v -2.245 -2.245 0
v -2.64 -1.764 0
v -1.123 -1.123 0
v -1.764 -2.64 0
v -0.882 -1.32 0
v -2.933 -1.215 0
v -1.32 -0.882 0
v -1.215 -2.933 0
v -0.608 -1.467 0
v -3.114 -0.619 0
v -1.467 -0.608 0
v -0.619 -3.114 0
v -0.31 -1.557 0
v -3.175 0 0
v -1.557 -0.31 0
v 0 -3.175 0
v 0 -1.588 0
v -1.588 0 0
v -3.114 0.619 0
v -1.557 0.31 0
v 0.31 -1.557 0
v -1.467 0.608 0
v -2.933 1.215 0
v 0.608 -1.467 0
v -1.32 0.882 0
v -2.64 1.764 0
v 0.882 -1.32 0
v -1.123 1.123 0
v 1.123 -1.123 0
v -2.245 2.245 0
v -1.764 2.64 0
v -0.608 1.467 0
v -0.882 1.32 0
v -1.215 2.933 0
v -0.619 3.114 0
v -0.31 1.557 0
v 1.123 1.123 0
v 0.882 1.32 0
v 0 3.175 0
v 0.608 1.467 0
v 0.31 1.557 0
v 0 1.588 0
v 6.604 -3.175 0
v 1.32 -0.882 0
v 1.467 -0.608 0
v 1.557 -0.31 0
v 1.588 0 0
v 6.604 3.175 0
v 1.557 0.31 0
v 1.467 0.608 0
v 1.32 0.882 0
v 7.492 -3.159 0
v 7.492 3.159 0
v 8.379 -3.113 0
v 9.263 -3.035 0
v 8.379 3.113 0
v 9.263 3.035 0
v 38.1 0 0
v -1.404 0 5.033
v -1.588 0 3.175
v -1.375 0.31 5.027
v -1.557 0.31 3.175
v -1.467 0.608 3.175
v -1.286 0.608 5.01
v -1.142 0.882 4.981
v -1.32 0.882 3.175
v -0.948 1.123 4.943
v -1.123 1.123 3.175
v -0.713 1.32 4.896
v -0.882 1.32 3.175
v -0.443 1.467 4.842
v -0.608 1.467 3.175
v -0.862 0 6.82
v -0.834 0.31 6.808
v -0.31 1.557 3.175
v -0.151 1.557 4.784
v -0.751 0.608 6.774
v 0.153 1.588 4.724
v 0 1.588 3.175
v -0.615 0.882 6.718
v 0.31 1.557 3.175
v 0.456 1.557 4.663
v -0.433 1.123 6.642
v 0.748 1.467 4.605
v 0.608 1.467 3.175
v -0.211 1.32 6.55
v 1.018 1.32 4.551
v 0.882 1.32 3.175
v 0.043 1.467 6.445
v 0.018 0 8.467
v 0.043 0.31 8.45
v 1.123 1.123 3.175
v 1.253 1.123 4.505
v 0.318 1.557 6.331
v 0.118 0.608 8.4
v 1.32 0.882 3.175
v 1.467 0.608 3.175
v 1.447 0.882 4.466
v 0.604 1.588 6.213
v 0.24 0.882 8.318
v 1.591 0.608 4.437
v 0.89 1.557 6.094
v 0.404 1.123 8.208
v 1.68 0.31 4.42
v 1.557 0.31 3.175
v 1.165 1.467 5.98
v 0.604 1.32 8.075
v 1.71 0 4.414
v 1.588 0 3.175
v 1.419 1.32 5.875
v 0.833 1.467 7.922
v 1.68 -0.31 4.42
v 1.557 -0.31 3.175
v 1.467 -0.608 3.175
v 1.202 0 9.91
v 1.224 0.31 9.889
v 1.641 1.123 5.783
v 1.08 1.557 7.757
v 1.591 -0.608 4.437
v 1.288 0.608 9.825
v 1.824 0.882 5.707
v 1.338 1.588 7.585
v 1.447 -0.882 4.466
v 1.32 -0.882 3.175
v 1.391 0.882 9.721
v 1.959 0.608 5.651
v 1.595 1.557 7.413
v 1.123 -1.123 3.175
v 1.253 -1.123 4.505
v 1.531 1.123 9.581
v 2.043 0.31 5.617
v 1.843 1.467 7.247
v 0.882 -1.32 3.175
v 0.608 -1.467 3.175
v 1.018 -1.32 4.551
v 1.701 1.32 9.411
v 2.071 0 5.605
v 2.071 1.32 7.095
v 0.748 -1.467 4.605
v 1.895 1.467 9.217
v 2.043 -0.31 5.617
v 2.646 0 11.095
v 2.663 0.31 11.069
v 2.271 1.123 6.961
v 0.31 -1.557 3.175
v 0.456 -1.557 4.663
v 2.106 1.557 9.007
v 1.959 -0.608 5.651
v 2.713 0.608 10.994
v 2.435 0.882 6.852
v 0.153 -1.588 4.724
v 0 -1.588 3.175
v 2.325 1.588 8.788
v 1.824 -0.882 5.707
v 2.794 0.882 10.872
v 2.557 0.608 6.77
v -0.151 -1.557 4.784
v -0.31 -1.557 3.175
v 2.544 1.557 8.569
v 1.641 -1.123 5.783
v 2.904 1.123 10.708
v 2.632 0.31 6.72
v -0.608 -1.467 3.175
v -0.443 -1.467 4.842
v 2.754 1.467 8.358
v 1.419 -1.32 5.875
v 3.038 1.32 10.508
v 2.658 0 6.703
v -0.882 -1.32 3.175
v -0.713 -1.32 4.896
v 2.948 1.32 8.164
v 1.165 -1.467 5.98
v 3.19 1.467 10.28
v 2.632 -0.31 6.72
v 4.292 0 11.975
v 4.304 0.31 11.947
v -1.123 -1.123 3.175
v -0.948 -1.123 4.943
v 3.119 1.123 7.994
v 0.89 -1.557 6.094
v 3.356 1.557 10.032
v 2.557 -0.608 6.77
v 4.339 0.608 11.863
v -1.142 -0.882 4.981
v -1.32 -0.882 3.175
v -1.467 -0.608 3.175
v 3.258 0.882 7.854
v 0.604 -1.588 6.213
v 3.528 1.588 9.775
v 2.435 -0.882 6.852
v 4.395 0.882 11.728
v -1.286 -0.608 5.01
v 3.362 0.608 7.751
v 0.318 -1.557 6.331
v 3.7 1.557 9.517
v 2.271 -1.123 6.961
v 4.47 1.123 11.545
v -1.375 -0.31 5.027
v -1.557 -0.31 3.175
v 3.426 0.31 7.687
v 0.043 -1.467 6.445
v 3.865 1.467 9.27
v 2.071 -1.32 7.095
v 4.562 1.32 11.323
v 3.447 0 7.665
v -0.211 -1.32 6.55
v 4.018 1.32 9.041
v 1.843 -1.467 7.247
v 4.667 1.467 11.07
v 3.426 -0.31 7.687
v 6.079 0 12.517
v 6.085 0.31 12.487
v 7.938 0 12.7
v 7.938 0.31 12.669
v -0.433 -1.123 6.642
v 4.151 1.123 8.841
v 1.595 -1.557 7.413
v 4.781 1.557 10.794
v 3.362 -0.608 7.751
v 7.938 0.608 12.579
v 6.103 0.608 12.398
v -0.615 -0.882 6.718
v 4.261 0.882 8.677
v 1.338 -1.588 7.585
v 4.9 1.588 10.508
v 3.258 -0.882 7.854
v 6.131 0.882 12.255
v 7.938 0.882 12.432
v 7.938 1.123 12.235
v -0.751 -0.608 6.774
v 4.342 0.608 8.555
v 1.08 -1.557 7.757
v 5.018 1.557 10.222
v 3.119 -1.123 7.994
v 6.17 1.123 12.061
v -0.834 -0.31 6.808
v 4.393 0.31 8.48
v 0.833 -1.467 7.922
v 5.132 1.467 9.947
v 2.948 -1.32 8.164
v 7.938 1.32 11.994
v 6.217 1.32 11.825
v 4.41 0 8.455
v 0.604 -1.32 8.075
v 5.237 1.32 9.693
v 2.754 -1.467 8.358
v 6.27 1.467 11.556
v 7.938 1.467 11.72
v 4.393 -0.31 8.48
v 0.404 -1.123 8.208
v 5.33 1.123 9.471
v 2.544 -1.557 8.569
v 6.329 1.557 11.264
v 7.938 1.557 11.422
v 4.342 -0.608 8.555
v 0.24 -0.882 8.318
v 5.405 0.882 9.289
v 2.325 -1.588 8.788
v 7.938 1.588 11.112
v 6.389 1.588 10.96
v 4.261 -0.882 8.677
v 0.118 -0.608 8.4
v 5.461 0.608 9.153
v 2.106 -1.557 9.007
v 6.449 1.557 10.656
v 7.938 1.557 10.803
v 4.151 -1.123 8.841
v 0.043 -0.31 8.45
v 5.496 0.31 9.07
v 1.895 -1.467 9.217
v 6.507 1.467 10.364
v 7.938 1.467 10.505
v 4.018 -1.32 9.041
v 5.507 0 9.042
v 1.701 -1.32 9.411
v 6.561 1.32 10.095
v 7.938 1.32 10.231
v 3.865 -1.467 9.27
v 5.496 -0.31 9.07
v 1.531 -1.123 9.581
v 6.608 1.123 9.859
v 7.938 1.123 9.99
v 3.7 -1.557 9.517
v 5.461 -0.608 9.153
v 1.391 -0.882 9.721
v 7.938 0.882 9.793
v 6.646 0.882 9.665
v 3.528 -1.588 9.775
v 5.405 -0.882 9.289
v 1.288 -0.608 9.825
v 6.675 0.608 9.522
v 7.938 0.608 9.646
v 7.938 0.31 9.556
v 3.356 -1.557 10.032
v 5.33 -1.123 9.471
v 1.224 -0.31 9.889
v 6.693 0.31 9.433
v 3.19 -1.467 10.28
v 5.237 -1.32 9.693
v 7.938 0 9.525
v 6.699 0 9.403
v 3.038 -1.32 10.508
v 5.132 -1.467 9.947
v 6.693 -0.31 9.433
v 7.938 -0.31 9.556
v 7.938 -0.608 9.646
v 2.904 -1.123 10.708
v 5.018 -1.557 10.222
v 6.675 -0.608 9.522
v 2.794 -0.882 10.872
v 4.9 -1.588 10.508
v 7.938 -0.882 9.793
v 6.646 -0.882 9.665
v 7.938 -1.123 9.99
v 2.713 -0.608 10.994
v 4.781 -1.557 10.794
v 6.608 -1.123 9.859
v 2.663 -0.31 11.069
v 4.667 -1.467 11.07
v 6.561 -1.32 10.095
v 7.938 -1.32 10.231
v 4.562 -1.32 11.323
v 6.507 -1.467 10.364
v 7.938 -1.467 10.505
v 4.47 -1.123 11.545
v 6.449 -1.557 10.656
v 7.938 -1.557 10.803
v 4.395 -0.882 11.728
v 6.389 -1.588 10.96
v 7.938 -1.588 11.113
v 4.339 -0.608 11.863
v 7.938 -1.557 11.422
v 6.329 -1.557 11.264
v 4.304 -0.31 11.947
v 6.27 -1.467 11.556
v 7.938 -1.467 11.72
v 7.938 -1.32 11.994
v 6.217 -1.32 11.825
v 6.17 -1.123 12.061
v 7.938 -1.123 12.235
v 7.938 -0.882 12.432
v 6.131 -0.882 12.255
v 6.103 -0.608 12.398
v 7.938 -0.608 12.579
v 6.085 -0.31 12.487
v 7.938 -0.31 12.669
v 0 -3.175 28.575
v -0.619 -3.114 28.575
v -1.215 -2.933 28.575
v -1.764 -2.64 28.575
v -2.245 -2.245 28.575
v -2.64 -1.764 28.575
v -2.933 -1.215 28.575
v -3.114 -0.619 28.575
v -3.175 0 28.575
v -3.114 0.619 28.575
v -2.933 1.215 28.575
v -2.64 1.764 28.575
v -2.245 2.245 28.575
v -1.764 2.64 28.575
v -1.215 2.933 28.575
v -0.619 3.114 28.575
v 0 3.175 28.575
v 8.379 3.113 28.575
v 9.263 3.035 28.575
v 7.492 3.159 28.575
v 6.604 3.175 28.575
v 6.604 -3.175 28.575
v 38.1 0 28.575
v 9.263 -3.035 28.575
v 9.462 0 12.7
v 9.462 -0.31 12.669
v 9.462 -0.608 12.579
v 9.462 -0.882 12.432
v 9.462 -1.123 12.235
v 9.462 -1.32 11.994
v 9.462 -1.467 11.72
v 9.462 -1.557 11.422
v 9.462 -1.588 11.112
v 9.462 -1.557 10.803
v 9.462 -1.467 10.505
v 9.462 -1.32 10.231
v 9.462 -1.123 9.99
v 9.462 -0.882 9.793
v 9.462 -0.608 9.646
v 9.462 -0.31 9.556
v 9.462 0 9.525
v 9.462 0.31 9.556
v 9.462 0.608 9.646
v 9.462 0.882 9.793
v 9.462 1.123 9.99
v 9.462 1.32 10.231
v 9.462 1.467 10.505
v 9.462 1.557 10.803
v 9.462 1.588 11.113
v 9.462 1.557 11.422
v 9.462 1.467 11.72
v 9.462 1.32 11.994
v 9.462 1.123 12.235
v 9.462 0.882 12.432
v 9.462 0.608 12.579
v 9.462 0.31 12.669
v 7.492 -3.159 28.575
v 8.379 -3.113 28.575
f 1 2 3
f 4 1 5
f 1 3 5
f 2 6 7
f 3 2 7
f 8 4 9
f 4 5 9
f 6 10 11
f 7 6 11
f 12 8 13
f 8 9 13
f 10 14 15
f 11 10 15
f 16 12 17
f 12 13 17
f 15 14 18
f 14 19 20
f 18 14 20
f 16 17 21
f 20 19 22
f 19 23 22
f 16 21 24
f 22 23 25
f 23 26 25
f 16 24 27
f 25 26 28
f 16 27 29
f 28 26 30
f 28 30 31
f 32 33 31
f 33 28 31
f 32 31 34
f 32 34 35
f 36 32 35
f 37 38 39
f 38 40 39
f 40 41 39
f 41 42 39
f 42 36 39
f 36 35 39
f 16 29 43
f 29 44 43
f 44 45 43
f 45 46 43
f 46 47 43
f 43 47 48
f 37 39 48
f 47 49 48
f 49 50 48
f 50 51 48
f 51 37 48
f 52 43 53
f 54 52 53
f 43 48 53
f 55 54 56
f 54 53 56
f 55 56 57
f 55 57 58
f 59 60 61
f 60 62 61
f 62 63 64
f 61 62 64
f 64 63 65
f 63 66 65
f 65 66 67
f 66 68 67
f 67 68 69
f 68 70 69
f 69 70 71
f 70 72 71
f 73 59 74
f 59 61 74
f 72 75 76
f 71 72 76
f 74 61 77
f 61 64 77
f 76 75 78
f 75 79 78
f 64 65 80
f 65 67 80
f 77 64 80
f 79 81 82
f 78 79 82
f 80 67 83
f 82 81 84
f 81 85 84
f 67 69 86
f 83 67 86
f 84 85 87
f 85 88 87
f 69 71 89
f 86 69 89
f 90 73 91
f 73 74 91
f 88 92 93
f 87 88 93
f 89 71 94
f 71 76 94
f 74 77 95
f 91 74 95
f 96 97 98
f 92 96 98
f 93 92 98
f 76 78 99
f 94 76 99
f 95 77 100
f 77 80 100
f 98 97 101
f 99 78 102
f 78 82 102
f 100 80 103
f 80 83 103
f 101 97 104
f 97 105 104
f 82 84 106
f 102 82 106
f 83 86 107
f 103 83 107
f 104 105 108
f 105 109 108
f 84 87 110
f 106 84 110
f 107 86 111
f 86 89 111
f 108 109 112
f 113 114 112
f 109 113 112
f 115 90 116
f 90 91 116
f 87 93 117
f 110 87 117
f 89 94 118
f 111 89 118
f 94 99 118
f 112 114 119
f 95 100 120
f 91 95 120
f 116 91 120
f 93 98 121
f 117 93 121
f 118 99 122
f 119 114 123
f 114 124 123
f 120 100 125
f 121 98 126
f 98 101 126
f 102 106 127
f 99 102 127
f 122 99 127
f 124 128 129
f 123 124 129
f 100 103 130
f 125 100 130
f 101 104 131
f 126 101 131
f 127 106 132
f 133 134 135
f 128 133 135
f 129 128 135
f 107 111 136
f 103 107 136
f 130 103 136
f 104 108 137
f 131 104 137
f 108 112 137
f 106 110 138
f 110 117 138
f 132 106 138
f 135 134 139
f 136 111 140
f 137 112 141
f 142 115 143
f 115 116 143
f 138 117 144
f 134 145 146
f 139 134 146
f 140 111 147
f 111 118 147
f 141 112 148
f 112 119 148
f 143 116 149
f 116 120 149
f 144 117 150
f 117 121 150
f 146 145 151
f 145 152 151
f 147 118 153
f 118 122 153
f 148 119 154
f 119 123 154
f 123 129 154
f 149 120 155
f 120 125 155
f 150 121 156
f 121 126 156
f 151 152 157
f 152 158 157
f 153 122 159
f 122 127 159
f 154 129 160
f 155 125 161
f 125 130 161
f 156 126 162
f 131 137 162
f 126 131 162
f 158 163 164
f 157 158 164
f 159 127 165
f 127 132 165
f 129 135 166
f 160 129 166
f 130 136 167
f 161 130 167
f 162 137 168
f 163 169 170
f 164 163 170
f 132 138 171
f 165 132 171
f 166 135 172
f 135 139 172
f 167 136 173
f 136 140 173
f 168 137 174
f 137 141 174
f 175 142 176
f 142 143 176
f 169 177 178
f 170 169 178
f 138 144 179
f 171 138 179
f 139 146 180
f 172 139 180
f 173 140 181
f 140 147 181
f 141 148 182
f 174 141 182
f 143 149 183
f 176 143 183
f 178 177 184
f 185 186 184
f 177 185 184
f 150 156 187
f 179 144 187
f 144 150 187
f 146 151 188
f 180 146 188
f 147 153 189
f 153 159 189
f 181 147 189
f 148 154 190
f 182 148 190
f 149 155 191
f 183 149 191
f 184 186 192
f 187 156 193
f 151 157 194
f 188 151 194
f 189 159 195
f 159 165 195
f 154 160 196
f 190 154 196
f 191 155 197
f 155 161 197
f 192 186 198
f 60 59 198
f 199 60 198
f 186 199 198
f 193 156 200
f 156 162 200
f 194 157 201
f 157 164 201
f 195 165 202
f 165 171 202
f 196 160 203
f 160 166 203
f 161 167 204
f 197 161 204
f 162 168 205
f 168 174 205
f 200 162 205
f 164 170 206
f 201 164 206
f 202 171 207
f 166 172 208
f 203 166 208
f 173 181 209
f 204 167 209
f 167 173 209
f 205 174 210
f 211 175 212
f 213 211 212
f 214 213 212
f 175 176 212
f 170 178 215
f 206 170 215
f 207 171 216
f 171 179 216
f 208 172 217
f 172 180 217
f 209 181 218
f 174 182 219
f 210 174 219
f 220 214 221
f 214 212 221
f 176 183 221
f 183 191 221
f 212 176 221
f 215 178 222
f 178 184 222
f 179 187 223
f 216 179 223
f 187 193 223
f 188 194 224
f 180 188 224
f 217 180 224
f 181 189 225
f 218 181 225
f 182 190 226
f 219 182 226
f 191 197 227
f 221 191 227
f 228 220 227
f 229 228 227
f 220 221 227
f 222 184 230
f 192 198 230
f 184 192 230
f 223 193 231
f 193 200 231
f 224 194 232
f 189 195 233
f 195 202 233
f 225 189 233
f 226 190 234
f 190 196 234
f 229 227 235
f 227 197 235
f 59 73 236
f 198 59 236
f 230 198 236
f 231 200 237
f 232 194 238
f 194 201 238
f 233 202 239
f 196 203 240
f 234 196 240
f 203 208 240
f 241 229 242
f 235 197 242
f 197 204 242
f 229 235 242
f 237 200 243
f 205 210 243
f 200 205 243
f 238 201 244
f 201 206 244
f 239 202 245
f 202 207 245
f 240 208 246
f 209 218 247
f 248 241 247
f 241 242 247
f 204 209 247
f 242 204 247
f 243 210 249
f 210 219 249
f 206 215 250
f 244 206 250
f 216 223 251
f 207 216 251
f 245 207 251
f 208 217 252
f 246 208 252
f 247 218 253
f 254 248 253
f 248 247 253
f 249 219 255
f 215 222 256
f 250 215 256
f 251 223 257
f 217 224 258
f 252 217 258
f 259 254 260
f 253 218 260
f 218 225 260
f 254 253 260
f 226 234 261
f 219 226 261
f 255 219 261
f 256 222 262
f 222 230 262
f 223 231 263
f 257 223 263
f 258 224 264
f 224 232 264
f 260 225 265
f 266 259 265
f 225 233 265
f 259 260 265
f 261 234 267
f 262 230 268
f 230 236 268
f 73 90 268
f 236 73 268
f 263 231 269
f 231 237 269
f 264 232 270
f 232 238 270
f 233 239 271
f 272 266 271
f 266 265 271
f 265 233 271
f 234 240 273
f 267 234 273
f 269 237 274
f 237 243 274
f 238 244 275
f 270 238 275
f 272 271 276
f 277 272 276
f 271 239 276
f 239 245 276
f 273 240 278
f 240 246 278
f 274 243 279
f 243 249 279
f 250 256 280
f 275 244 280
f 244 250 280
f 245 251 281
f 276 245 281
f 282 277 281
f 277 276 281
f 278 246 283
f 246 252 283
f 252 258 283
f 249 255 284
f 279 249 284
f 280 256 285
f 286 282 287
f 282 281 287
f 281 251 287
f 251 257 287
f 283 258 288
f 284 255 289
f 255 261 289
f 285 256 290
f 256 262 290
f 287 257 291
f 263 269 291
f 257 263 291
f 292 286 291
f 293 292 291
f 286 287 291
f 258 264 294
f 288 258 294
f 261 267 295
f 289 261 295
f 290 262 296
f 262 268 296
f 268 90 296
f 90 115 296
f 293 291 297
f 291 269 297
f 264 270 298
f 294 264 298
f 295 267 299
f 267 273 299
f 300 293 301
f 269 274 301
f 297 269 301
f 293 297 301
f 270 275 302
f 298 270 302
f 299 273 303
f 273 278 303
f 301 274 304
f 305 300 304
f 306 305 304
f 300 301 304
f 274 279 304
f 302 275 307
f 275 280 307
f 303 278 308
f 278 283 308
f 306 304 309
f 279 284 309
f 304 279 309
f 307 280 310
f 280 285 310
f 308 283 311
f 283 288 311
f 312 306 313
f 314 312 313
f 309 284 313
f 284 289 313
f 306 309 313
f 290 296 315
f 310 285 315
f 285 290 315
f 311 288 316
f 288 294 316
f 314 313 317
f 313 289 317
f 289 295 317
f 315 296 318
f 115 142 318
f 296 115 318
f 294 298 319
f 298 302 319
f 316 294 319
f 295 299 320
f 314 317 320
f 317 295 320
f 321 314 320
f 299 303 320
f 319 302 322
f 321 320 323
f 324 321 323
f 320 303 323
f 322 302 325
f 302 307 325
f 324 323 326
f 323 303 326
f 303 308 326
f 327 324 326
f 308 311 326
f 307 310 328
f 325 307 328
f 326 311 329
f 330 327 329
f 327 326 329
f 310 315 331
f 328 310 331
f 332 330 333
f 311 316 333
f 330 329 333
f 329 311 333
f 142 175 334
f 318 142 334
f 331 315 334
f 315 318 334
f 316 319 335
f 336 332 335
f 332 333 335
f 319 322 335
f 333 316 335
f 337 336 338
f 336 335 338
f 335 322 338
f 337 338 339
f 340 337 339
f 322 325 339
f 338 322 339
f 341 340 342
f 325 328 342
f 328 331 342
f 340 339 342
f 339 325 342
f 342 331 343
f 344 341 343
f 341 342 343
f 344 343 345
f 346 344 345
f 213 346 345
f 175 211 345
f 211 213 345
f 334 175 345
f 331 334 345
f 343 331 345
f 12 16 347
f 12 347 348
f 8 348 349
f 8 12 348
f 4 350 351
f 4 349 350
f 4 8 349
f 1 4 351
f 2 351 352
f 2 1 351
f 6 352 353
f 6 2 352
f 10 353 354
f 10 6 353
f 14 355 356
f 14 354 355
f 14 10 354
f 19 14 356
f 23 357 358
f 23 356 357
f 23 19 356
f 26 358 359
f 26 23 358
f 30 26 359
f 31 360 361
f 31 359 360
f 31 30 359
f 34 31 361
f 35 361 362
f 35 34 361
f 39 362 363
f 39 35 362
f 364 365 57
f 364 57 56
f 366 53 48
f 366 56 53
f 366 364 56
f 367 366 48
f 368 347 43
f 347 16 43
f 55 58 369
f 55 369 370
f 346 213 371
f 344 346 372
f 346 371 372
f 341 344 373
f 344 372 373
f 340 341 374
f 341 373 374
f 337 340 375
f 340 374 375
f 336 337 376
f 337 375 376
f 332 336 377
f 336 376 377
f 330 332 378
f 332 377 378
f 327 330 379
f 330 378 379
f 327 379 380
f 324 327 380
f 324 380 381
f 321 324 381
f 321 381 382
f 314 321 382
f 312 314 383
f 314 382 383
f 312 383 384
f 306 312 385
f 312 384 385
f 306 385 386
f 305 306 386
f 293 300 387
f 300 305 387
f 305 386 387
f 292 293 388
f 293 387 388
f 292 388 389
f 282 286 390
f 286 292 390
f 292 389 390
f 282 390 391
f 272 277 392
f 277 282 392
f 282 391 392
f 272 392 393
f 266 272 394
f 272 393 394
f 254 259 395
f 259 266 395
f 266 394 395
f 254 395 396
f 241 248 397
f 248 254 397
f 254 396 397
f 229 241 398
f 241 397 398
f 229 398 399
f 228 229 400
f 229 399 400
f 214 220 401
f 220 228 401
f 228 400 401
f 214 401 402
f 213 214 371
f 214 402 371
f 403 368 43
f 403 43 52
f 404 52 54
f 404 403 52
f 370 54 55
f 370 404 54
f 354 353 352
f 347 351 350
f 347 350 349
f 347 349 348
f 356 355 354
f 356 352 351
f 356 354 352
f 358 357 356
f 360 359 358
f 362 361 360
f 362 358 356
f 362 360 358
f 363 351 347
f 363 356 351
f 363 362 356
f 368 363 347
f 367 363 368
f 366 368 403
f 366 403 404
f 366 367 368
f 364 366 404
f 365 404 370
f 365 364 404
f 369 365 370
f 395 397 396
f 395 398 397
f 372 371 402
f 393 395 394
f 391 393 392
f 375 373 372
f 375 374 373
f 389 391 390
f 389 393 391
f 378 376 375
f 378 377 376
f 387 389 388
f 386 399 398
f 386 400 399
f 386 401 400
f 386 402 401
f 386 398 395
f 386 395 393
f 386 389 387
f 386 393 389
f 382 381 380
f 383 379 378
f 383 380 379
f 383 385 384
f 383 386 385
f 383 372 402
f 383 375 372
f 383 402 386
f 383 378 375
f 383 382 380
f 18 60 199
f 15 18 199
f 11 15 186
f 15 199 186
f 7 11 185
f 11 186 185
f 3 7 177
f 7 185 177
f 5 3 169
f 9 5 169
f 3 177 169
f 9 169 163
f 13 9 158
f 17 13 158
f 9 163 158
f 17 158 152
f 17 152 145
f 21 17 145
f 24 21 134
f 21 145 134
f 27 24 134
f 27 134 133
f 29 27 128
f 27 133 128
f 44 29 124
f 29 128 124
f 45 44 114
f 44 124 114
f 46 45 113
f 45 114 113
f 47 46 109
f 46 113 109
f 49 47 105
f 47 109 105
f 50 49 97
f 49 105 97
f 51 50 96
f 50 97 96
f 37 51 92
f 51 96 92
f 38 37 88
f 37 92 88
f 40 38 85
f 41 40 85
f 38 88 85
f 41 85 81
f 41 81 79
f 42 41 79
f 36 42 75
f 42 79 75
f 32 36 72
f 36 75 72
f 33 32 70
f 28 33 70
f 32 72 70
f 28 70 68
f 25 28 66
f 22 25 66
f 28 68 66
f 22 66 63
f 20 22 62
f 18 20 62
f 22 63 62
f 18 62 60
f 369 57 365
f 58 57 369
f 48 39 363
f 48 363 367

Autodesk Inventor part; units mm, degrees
ref_plane "YZ Plane" through (0, 0, 0) normal (1, 0, 0) x (0, 1, 0)
ref_plane "XZ Plane" through (0, 0, 0) normal (0, 1, 0) x (-1, 0, 0)
ref_plane "XY Plane" through (0, 0, 0) normal (0, 0, 1) x (1, 0, 0)
sketch "Sketch5" plane through (0, 0, 0) normal (0, 0, 1) x (1, 0, 0)
  circle A0 centre (0, 0) radius 3.175
  line L0 (0, 3.175) -> (7.9375, 3.175)
  line L1 (0, -3.175) -> (7.9375, -3.175)
  line L2 (7.9375, 3.175) -> (38.1, 0)
  line L3 (38.1, 0) -> (7.9375, -3.175)
  dimension "d16" = 6.35
  dimension "d17" = 7.9375
  dimension "d18" = 7.9375
  dimension "d19" = 38.1
extrude "Extrusion2" add sketch "Sketch5" along normal blind 28.575
sketch "Sketch6" plane through (0, 0, 0) normal (0, 0, -1) x (-1, 0, 0)
  circle A0 centre (0, 0) radius 1.5875
  dimension "d22" = 3.175
sketch "Sketch7" plane through (0, 0, 0) normal (0, 1, 0) x (-1, 0, 0)
  line L0 (0, 0) -> (0, 3.175)
  line L1 (-7.9375, 11.1125) -> (-9.4615, 11.1125)
  arc A0 (0, 3.175) -> (-7.9375, 11.1125) centre (-7.9375, 3.175) ccw
  dimension "d23" = 3.175
  dimension "d26" = 1.524
  dimension "d27" = 7.9375
  dimension "d28" = 7.9375
sweep "Sweep2" cut profiles "Sketch6" path "Sketch7"
fillet "Fillet1" radius 25.4 2 edges at (7.9375, 3.175, 14.2875) (7.9375, -3.175, 14.2875)
properties part number "foreDivePlanes" material "ABS Plastic"
